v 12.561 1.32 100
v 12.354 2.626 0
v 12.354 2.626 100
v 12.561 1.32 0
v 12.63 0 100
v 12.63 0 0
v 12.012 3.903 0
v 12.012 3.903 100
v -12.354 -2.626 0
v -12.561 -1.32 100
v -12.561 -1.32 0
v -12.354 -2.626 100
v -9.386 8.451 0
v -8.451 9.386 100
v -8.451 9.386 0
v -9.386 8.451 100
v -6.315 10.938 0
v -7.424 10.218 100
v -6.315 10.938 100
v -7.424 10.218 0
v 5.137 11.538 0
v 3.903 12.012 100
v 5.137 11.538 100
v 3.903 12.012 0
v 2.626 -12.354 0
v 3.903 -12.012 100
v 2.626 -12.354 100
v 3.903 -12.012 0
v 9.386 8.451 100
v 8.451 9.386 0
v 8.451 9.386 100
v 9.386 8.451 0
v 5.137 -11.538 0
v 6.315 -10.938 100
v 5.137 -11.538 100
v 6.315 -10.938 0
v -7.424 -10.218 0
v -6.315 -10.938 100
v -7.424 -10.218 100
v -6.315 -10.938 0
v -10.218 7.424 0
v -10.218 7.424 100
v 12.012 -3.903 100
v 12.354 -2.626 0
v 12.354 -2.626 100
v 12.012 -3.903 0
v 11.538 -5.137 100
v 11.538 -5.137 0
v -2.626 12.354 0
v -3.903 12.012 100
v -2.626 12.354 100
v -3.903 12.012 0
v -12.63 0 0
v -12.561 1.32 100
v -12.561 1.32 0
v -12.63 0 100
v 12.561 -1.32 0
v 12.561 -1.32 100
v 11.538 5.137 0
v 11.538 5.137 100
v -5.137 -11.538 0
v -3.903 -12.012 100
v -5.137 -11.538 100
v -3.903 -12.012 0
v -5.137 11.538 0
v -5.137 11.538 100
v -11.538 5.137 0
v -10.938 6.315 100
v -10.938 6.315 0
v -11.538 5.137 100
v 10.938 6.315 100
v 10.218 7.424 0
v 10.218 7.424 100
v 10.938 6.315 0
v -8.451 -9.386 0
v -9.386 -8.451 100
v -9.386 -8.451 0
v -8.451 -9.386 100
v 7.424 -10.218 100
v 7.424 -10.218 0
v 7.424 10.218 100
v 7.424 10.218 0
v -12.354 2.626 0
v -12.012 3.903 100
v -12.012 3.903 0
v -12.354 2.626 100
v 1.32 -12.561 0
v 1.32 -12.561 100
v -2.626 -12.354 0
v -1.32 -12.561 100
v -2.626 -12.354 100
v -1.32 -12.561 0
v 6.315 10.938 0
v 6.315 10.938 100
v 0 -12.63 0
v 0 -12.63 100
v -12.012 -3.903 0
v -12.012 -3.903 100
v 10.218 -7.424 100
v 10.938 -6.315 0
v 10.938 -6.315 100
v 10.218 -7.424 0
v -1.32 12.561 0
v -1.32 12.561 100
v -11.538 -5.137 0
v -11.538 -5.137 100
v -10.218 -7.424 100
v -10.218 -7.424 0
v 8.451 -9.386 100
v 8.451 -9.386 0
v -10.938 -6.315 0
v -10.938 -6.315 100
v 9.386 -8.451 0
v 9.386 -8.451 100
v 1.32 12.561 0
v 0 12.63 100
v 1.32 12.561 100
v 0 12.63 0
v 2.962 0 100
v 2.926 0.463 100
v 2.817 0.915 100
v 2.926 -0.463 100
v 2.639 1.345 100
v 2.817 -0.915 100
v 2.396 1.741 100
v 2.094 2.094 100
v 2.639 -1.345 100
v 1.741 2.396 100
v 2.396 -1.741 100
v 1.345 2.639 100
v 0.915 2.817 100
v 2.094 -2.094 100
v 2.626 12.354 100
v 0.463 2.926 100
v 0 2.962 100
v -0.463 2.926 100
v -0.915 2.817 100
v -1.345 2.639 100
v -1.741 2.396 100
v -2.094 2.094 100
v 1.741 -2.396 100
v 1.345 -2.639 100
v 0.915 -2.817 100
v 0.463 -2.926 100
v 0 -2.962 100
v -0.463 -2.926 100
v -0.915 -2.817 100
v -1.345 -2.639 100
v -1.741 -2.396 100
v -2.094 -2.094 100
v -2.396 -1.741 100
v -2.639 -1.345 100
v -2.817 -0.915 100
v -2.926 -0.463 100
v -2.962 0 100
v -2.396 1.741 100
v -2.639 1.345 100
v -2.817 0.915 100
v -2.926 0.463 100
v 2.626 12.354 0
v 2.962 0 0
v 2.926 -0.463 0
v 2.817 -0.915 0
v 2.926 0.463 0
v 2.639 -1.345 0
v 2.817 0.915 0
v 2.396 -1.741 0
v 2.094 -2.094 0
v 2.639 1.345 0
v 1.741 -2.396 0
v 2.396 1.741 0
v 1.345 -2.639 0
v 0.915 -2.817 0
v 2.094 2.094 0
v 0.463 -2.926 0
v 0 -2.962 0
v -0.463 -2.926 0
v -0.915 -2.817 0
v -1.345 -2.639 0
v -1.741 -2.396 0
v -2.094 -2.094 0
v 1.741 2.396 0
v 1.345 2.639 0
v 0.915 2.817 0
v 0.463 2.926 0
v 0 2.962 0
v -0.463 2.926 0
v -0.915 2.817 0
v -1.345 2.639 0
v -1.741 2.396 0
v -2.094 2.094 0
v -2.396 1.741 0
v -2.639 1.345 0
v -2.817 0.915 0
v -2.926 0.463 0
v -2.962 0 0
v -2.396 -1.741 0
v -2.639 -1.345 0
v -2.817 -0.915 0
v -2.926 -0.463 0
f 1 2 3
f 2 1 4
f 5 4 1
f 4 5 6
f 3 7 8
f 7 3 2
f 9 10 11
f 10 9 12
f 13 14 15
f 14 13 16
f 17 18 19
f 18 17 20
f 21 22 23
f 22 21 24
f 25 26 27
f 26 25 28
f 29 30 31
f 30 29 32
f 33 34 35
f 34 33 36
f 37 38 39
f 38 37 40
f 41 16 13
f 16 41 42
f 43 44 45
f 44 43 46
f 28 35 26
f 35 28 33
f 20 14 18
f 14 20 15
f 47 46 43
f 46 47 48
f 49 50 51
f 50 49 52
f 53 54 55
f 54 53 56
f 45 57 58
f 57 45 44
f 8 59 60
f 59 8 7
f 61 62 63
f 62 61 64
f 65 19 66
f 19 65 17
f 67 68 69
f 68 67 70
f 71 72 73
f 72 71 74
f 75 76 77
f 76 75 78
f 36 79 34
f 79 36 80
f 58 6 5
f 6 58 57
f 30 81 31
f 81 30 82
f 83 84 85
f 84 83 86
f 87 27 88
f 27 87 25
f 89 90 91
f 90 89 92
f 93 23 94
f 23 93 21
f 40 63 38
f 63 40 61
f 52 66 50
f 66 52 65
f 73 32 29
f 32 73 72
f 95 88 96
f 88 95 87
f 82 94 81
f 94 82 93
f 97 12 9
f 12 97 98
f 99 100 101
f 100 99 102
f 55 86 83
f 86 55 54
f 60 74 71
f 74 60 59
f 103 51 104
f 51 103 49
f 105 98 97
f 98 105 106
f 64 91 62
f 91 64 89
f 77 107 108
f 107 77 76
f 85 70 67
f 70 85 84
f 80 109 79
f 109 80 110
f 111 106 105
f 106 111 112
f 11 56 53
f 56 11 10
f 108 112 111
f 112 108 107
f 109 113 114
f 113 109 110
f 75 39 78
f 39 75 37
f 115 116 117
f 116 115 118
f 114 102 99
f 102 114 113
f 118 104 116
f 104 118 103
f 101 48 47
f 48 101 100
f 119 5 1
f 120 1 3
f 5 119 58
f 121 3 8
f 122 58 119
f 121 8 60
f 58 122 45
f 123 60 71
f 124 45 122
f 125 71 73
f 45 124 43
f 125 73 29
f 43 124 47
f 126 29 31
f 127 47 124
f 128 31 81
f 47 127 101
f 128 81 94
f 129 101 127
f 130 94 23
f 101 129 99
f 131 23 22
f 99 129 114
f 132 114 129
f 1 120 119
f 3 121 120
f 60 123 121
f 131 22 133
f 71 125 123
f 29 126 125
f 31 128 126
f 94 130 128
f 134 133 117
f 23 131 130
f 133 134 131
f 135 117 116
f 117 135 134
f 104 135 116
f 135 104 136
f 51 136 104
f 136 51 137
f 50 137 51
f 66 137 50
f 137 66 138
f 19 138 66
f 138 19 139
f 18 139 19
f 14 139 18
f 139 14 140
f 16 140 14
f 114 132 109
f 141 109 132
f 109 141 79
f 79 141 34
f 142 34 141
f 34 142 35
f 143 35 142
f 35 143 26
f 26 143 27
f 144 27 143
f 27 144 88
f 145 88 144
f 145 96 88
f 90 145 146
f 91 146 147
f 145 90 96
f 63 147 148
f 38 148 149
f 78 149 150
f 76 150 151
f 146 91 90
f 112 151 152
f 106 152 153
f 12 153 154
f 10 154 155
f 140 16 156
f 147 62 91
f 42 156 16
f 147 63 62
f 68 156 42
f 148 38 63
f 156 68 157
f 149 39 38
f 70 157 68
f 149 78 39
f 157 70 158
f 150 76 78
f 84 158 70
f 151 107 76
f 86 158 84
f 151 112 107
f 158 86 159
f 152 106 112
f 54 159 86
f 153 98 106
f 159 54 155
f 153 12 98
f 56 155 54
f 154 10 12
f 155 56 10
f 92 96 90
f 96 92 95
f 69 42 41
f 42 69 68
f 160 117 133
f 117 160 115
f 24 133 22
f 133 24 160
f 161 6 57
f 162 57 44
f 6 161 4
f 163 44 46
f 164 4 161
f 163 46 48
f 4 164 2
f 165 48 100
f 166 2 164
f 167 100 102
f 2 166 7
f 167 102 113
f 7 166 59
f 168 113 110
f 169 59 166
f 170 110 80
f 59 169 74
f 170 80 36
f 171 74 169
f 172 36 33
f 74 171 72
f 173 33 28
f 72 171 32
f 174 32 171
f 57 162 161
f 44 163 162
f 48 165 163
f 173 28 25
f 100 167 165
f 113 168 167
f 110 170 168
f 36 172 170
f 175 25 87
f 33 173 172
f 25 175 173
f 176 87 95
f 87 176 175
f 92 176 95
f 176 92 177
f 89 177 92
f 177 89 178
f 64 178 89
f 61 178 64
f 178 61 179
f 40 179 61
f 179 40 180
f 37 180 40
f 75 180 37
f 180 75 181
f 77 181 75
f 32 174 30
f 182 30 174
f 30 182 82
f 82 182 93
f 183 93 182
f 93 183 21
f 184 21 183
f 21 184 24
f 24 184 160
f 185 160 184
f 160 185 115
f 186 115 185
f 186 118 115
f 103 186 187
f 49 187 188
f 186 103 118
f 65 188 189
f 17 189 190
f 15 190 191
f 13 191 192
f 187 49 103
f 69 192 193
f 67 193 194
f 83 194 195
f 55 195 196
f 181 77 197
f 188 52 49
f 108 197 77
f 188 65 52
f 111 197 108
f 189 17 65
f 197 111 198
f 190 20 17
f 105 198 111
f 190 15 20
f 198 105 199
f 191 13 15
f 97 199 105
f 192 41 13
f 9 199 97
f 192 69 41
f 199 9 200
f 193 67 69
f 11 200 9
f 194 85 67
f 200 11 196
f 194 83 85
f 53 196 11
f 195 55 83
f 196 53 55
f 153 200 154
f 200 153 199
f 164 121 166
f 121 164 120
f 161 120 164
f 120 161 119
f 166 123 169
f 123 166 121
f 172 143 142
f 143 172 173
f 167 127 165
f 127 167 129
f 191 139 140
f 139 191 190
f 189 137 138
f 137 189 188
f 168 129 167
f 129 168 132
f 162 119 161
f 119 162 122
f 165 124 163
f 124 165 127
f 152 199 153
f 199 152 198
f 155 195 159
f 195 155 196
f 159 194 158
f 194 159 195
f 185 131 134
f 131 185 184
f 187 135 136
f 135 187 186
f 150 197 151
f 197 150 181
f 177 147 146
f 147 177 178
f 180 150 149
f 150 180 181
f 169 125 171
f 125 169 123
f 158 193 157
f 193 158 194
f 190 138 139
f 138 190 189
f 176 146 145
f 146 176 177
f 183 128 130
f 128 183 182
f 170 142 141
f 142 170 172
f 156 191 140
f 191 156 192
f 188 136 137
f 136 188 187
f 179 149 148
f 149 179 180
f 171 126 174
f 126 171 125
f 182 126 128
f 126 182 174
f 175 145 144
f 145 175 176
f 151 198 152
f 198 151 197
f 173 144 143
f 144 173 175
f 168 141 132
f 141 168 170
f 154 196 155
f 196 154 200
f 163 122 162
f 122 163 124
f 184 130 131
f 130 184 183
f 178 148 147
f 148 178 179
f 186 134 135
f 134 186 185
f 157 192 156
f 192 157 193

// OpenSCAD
        wall_thickness = 2.78;
        bore_clearance = 0.962;
        roller_radius = 12.63;

        module roller() {
            difference() {
                cylinder(h=100, r=roller_radius, $fn=60);
                translate([0,0,-5])
                    cylinder(h=110, r=bore_clearance + 2, $fn=40);
            }
        }
        roller();
        
